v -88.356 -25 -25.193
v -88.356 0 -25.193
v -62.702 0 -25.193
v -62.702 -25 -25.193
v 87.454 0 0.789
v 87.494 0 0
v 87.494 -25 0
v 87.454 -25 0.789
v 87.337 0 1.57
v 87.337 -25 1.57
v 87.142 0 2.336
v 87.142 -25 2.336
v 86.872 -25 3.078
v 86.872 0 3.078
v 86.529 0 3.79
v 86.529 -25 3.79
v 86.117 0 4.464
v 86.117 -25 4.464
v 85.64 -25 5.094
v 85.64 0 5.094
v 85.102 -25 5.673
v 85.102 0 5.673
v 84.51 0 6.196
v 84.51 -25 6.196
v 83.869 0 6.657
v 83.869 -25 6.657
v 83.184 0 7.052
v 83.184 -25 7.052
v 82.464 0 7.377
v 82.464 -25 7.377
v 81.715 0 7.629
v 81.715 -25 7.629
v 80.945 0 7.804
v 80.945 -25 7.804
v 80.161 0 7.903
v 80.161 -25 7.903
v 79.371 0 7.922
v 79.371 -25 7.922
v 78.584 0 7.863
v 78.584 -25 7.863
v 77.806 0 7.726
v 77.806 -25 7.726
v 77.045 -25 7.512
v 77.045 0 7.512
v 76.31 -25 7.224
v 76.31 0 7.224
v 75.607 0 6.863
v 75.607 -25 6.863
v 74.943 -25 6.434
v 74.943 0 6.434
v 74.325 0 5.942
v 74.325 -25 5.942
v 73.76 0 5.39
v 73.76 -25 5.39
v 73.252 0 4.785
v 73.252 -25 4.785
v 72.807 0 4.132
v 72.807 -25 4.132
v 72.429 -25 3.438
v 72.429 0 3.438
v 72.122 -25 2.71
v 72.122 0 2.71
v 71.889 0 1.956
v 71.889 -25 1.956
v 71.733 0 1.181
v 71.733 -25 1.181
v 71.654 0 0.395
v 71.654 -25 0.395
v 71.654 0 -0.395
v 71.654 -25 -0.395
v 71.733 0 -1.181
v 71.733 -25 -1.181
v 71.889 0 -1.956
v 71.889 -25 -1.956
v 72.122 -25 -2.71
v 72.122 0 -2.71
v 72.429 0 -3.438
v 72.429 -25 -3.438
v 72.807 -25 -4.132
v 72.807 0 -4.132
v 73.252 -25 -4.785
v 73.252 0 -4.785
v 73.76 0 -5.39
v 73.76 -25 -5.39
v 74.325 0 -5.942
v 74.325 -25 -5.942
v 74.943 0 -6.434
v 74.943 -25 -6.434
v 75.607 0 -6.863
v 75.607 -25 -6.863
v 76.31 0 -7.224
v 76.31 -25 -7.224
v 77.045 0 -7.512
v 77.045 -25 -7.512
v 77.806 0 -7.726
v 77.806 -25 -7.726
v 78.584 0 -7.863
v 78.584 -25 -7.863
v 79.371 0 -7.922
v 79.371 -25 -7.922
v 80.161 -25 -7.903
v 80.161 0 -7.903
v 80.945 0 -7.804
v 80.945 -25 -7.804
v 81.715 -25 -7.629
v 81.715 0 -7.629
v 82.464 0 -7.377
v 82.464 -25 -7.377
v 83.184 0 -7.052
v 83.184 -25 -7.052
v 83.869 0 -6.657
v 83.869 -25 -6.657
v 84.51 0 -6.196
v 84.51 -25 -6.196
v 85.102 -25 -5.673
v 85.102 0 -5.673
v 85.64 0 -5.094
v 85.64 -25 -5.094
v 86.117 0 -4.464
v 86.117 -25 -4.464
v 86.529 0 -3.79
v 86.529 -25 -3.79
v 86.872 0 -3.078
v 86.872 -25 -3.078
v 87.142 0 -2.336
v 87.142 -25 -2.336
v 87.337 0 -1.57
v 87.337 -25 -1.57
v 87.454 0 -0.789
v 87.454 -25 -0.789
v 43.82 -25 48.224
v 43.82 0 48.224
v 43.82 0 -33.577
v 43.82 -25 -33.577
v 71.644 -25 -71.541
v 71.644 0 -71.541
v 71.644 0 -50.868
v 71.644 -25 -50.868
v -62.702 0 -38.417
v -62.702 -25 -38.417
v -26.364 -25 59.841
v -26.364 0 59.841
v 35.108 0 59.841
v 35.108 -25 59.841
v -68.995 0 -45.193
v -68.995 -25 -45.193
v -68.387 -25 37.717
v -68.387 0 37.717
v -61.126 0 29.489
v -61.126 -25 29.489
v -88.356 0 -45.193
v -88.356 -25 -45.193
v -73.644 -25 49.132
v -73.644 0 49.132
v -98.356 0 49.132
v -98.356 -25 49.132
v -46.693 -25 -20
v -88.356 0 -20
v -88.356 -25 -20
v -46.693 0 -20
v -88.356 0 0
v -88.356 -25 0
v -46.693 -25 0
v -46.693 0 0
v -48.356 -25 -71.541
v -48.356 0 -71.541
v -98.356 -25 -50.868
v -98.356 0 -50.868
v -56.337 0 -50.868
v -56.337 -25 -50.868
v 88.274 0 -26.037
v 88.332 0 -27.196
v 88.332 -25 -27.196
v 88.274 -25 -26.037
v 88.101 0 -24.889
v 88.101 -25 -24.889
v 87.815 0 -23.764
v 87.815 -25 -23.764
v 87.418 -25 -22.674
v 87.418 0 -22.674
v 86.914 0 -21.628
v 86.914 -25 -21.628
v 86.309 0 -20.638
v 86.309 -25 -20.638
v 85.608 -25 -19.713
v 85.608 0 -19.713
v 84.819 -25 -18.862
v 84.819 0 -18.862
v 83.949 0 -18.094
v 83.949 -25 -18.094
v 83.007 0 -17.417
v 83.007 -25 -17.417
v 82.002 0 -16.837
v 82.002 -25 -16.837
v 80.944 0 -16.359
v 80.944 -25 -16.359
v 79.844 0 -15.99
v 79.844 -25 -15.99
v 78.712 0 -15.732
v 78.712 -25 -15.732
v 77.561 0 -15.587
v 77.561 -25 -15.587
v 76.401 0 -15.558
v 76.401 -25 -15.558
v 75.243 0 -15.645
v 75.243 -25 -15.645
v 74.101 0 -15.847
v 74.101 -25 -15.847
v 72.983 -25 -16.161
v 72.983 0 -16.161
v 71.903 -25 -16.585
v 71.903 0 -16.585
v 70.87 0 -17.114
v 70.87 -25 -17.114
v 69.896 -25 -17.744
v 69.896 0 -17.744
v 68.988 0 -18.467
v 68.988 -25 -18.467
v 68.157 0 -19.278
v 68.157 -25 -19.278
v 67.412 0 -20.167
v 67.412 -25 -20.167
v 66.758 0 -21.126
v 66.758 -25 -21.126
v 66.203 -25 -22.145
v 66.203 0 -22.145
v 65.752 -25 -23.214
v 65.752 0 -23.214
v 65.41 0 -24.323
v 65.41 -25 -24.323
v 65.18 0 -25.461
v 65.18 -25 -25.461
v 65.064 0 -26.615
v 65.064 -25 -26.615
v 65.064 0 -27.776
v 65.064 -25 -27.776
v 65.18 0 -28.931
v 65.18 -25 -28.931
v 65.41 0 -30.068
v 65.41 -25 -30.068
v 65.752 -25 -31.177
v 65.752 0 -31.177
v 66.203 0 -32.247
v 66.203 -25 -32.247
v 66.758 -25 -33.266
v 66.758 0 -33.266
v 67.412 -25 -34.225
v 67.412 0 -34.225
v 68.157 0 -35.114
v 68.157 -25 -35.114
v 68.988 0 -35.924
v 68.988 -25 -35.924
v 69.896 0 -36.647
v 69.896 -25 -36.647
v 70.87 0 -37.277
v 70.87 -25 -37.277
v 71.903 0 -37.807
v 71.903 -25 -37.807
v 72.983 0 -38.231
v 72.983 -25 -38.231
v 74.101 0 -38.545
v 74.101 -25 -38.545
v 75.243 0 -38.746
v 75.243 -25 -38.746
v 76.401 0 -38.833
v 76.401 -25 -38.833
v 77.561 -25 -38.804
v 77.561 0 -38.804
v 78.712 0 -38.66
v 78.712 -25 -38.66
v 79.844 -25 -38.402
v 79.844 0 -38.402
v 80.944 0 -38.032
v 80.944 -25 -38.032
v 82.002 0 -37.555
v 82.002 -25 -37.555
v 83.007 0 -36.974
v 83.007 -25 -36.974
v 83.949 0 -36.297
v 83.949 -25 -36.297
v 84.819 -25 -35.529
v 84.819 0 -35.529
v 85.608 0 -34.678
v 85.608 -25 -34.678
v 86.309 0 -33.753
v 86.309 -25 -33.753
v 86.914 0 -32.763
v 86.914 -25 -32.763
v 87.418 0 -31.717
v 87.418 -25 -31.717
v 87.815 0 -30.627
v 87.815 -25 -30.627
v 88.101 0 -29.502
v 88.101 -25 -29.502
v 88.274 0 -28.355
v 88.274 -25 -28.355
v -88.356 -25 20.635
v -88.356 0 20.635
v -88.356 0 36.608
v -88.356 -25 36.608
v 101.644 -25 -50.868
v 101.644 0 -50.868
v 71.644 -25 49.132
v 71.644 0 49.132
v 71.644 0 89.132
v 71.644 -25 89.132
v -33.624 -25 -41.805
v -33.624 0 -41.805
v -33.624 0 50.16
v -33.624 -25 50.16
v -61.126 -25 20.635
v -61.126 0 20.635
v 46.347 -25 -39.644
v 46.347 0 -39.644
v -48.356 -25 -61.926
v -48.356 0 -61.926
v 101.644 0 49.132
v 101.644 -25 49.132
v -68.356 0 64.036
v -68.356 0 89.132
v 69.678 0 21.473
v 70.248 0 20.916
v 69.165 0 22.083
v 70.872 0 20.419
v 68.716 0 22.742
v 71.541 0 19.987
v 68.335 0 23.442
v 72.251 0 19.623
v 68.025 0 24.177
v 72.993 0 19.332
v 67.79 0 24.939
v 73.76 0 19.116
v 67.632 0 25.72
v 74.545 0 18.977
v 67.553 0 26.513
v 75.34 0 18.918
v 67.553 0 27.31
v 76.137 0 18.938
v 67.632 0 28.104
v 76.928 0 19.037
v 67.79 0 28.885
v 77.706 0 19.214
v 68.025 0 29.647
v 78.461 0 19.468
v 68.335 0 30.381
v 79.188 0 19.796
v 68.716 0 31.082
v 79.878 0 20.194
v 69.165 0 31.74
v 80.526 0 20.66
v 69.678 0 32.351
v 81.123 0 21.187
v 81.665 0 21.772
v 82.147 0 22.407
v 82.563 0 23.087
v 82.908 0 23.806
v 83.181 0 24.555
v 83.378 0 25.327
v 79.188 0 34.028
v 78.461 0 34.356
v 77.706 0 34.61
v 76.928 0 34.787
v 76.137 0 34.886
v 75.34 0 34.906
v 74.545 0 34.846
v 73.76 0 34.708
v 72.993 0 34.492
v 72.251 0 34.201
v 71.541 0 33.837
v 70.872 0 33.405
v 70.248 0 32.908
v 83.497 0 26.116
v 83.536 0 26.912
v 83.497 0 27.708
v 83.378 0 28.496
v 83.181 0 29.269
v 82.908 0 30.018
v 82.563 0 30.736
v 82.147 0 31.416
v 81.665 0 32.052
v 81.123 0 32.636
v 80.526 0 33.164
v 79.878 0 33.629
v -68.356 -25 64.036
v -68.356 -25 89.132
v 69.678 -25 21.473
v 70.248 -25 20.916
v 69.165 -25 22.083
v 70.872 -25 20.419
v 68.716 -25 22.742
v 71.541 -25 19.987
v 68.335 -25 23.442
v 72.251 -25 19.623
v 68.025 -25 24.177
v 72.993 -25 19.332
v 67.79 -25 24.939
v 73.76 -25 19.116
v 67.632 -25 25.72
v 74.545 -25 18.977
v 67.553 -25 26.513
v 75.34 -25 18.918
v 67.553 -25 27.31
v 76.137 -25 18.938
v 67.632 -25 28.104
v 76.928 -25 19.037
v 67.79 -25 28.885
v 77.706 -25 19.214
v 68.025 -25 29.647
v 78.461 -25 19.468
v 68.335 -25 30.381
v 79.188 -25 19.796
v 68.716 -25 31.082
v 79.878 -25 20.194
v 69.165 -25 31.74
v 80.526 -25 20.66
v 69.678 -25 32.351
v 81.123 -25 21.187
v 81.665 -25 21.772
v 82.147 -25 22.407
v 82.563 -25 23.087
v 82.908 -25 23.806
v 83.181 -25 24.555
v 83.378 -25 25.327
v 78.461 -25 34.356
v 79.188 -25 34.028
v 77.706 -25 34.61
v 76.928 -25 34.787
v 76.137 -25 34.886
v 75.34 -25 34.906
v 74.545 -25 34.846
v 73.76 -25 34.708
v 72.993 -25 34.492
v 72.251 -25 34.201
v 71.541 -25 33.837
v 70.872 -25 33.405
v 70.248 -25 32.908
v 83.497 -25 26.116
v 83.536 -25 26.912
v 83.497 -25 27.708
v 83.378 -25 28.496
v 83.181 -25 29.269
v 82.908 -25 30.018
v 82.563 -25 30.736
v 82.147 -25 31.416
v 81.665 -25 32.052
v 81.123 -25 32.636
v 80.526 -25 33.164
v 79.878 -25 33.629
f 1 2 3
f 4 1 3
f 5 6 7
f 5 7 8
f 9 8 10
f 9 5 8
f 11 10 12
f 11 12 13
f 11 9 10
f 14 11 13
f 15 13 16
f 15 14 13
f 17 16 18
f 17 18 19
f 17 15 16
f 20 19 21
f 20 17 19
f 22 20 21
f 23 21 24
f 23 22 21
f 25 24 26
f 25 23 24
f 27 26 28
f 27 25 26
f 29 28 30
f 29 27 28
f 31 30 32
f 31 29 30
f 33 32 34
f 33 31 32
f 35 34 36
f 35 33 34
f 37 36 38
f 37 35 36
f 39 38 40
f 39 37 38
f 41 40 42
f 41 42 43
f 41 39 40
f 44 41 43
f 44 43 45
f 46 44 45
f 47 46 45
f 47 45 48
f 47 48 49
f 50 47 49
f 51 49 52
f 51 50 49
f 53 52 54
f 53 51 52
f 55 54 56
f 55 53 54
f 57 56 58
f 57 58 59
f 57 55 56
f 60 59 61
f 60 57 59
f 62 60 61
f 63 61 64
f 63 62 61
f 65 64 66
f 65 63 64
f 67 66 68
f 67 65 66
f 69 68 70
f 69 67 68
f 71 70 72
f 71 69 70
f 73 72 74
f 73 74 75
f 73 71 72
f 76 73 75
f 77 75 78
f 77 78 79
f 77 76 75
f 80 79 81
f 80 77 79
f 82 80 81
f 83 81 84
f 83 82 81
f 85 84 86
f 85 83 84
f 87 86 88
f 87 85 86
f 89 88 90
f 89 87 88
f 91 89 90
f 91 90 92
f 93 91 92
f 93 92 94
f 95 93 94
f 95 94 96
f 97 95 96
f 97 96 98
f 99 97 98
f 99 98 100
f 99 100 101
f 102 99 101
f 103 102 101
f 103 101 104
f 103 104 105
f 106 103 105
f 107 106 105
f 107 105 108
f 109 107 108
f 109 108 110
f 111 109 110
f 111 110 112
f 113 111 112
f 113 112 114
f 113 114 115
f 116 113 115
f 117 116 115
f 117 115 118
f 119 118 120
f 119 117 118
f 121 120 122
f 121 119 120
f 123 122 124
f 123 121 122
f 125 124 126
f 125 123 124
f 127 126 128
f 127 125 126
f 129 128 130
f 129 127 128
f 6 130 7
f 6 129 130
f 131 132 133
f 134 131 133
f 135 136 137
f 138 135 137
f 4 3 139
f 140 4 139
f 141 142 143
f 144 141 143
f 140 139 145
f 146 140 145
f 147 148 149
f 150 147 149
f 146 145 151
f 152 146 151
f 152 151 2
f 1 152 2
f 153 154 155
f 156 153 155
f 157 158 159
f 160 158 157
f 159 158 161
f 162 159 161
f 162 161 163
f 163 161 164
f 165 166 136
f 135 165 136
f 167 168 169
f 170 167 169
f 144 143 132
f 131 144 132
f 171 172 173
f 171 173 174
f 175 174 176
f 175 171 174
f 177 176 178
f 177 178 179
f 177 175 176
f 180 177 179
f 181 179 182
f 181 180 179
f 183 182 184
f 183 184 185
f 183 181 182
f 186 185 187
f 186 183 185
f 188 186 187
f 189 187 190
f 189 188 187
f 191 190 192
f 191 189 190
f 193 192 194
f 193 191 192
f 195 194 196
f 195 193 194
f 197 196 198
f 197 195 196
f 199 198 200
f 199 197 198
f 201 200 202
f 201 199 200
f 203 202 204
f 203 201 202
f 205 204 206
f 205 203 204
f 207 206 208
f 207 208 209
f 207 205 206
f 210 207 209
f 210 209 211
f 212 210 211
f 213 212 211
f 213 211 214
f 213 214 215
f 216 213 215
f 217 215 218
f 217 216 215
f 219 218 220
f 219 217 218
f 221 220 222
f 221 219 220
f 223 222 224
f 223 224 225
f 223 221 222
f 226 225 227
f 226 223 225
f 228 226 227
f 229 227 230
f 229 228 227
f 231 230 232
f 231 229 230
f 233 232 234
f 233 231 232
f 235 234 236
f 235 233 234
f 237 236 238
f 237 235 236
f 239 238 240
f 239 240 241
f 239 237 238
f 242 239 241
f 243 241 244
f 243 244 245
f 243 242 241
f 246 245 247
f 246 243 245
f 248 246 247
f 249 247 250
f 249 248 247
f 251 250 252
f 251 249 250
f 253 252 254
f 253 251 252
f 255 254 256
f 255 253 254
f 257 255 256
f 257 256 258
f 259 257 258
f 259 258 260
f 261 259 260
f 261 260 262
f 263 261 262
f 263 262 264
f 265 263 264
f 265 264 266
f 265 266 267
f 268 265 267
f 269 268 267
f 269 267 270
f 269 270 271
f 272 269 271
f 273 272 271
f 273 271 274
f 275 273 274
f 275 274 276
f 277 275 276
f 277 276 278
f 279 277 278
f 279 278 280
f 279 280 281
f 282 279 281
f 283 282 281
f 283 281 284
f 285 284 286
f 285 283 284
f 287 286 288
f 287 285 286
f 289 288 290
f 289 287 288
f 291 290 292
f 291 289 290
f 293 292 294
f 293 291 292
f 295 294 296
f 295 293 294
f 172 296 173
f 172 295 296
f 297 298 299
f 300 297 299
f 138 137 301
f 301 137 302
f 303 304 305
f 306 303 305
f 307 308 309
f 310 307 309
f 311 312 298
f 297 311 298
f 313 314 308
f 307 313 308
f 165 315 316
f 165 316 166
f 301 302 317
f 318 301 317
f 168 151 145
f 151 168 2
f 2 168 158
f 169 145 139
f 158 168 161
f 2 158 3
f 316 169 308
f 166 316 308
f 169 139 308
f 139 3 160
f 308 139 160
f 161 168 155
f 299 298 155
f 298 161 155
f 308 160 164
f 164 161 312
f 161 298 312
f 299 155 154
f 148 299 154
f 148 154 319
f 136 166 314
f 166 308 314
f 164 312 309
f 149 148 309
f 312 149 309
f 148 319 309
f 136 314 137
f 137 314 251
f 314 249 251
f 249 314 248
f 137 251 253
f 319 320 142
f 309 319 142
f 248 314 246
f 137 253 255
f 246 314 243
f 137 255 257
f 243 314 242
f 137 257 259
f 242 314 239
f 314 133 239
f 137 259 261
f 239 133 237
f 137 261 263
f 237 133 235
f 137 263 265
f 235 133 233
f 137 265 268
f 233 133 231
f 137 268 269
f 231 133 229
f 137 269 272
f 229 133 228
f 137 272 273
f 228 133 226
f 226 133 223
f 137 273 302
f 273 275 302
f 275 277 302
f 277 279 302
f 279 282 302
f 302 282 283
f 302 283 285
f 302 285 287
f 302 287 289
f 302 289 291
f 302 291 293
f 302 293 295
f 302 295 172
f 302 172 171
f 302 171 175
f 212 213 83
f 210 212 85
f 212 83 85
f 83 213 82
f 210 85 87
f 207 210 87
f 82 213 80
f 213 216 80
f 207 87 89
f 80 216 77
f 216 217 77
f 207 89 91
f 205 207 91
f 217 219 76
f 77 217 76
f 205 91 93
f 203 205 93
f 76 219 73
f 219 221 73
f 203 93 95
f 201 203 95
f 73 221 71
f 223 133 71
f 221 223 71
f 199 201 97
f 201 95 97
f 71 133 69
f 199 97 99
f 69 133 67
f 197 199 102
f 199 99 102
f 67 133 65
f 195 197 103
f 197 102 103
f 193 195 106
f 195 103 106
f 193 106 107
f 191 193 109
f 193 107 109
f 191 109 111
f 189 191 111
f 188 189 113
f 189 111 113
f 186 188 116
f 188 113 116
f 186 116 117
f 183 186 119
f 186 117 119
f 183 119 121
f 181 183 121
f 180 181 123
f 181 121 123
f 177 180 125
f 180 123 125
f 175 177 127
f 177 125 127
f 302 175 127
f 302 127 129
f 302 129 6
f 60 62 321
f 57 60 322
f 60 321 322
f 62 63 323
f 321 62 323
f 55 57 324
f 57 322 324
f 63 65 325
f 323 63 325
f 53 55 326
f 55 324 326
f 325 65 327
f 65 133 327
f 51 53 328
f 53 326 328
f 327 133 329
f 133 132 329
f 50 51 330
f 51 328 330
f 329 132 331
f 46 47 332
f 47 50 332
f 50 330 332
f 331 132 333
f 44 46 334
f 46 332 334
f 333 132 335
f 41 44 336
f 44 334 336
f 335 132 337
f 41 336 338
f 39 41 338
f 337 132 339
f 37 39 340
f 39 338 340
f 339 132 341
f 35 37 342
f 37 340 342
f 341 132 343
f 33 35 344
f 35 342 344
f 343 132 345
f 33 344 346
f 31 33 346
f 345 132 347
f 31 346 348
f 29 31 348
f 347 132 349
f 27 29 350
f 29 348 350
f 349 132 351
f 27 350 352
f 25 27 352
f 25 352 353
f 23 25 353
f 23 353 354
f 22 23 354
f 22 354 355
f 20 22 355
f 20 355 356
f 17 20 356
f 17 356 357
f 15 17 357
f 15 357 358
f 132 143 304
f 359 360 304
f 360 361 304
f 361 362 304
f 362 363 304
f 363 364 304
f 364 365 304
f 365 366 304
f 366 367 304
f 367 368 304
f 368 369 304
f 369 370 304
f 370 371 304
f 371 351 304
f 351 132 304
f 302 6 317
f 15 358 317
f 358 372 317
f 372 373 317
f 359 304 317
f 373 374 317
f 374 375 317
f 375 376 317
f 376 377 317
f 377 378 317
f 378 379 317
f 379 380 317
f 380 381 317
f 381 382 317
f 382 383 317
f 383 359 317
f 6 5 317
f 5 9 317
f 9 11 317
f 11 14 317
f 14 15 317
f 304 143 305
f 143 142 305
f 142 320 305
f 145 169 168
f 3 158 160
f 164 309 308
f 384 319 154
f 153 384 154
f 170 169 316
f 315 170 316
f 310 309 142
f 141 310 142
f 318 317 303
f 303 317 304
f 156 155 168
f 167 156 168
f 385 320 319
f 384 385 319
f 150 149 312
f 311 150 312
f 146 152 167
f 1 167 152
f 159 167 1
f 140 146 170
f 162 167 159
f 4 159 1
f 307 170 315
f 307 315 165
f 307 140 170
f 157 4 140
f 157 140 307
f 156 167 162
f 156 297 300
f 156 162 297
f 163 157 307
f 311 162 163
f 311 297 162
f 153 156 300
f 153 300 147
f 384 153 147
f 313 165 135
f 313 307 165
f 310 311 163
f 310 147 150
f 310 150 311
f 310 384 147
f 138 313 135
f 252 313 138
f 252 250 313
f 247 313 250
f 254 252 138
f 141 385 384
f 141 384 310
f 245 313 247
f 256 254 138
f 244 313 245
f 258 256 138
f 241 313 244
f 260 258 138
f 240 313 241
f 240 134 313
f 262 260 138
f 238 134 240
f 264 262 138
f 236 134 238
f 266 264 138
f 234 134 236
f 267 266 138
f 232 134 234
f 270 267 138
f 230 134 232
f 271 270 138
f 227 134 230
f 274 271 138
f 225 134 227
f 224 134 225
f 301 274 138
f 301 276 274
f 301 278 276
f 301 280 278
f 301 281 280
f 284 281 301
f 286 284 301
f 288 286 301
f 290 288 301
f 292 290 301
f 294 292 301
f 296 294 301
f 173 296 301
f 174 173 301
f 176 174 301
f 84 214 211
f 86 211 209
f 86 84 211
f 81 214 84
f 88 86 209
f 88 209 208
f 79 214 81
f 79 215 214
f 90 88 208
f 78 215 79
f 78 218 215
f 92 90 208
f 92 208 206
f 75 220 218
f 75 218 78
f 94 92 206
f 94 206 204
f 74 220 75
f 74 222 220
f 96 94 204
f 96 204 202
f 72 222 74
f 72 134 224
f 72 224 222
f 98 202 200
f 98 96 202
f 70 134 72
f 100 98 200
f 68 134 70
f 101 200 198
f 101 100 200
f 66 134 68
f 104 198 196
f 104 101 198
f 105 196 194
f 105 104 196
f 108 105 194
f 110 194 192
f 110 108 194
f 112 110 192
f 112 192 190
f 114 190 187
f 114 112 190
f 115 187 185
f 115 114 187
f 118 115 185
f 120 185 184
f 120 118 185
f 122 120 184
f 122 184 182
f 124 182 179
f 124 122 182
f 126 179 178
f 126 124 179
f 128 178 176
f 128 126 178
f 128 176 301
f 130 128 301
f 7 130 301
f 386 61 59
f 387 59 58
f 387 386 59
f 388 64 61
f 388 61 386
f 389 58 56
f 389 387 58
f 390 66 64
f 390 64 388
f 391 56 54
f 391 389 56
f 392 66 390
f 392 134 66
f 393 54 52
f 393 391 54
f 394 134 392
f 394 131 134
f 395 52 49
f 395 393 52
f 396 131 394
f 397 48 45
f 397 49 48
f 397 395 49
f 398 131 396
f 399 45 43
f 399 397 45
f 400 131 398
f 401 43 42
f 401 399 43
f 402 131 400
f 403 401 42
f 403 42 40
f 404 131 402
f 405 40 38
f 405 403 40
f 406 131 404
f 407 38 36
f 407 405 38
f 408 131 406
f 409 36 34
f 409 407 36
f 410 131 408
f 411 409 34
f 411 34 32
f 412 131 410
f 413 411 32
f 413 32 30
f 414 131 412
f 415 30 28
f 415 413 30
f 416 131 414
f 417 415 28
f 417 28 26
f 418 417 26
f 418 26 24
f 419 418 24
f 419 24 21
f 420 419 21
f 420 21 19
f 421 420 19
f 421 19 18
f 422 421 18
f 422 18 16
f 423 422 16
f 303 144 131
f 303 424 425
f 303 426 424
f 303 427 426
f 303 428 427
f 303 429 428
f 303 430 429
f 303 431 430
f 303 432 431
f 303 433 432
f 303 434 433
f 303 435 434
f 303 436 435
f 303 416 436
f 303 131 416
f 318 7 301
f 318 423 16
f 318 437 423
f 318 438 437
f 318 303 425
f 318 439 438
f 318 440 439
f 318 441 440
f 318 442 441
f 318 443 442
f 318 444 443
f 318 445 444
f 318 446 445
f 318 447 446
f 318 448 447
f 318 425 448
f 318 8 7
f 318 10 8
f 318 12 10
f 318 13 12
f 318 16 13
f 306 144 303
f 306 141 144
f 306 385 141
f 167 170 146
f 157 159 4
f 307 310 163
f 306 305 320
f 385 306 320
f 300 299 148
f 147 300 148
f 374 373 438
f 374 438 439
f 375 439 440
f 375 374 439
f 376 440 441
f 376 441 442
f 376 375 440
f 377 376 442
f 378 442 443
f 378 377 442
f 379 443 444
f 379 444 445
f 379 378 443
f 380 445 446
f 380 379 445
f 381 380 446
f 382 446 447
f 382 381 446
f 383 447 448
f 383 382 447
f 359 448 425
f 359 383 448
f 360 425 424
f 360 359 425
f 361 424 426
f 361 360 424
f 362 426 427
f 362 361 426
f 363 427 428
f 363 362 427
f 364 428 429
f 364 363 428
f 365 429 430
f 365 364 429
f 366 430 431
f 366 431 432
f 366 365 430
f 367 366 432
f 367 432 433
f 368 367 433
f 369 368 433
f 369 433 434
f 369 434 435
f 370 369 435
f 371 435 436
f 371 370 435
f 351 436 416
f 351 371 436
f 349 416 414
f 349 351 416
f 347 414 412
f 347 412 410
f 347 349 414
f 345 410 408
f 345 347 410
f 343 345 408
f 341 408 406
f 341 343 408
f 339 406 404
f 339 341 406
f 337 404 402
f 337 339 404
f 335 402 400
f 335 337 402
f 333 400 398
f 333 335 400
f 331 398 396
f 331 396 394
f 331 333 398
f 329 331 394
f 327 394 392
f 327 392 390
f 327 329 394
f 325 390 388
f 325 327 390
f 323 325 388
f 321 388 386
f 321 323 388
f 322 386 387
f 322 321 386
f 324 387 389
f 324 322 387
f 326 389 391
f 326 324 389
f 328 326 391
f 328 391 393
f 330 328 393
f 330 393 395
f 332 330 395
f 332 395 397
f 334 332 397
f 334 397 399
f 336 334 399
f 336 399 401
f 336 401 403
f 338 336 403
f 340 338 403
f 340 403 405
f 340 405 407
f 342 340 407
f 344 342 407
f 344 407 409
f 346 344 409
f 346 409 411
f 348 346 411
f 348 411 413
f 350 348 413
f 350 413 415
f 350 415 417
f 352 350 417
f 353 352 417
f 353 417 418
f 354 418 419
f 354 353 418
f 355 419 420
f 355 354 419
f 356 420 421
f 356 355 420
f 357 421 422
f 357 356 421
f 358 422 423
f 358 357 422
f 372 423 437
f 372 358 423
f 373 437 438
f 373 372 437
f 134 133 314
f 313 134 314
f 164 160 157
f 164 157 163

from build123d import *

# Parameters (mm, degrees)
F0_W     = 41.662812
F0_H     = 20
F0_R     = 11.641019
F0_R_2   = 7.924866
F0_R_3   = 7.996653
F1_DEPTH = 25
F2_DEPTH = 25


with BuildPart() as f1:
    # F0 (on Front) → F1 (new body)
    with BuildSketch(Plane.XZ):
        Polygon((-73.644338, 49.131665), (-98.355876, 49.131665), (-98.355876, -50.868335), (-56.336644, -50.868335), (-48.355876, -61.926026), (-48.355876, -71.541415), (71.644124, -71.541415), (71.644124, -50.868335), (101.644124, -50.868335), (101.644124, 49.131665), (71.644124, 49.131665), (71.644124, 89.131665), (-68.355876, 89.131665), (-68.355876, 64.035509), align=None)
        Polygon((-88.355876, -45.193389), (-88.355876, -25.193389), (-62.702298, -25.193389), (-62.702298, -38.416974), (-68.994693, -45.193389), align=None, mode=Mode.SUBTRACT)
        with Locations((-67.52447, -10)):
            Rectangle(F0_W, F0_H, mode=Mode.SUBTRACT)
        with Locations((76.690935, -27.195666)):
            Circle(F0_R, mode=Mode.SUBTRACT)
        with Locations((79.56899, 0)):
            Circle(F0_R_2, mode=Mode.SUBTRACT)
        Polygon((-88.355876, 20.634644), (-88.355876, 36.607623), (-68.38667, 37.717025), (-61.126228, 29.488518), (-61.126228, 20.634644), align=None, mode=Mode.SUBTRACT)
        Polygon((-33.624265, 50.160453), (-26.363822, 59.841048), (35.10794, 59.841048), (43.820471, 48.224337), (43.820471, -33.576678), (46.346532, -39.643808), (-33.624265, -41.805182), align=None, mode=Mode.SUBTRACT)
        with Locations((75.539708, 26.911816)):
            Circle(F0_R_3, mode=Mode.SUBTRACT)
    extrude(amount=F1_DEPTH)

    # F0 (on Front) → F2 (join)
    with BuildSketch(Plane.XZ):
        Polygon((-73.644338, 49.131665), (-98.355876, 49.131665), (-98.355876, -50.868335), (-56.336644, -50.868335), (-48.355876, -61.926026), (-48.355876, -71.541415), (71.644124, -71.541415), (71.644124, -50.868335), (101.644124, -50.868335), (101.644124, 49.131665), (71.644124, 49.131665), (71.644124, 89.131665), (-68.355876, 89.131665), (-68.355876, 64.035509), align=None)
        Polygon((-88.355876, -45.193389), (-88.355876, -25.193389), (-62.702298, -25.193389), (-62.702298, -38.416974), (-68.994693, -45.193389), align=None, mode=Mode.SUBTRACT)
        with Locations((-67.52447, -10)):
            Rectangle(F0_W, F0_H, mode=Mode.SUBTRACT)
        with Locations((76.690935, -27.195666)):
            Circle(F0_R, mode=Mode.SUBTRACT)
        with Locations((79.56899, 0)):
            Circle(F0_R_2, mode=Mode.SUBTRACT)
        Polygon((-88.355876, 20.634644), (-88.355876, 36.607623), (-68.38667, 37.717025), (-61.126228, 29.488518), (-61.126228, 20.634644), align=None, mode=Mode.SUBTRACT)
        Polygon((-33.624265, 50.160453), (-26.363822, 59.841048), (35.10794, 59.841048), (43.820471, 48.224337), (43.820471, -33.576678), (46.346532, -39.643808), (-33.624265, -41.805182), align=None, mode=Mode.SUBTRACT)
        with Locations((75.539708, 26.911816)):
            Circle(F0_R_3, mode=Mode.SUBTRACT)
    extrude(amount=F2_DEPTH)


solid = f1.part
